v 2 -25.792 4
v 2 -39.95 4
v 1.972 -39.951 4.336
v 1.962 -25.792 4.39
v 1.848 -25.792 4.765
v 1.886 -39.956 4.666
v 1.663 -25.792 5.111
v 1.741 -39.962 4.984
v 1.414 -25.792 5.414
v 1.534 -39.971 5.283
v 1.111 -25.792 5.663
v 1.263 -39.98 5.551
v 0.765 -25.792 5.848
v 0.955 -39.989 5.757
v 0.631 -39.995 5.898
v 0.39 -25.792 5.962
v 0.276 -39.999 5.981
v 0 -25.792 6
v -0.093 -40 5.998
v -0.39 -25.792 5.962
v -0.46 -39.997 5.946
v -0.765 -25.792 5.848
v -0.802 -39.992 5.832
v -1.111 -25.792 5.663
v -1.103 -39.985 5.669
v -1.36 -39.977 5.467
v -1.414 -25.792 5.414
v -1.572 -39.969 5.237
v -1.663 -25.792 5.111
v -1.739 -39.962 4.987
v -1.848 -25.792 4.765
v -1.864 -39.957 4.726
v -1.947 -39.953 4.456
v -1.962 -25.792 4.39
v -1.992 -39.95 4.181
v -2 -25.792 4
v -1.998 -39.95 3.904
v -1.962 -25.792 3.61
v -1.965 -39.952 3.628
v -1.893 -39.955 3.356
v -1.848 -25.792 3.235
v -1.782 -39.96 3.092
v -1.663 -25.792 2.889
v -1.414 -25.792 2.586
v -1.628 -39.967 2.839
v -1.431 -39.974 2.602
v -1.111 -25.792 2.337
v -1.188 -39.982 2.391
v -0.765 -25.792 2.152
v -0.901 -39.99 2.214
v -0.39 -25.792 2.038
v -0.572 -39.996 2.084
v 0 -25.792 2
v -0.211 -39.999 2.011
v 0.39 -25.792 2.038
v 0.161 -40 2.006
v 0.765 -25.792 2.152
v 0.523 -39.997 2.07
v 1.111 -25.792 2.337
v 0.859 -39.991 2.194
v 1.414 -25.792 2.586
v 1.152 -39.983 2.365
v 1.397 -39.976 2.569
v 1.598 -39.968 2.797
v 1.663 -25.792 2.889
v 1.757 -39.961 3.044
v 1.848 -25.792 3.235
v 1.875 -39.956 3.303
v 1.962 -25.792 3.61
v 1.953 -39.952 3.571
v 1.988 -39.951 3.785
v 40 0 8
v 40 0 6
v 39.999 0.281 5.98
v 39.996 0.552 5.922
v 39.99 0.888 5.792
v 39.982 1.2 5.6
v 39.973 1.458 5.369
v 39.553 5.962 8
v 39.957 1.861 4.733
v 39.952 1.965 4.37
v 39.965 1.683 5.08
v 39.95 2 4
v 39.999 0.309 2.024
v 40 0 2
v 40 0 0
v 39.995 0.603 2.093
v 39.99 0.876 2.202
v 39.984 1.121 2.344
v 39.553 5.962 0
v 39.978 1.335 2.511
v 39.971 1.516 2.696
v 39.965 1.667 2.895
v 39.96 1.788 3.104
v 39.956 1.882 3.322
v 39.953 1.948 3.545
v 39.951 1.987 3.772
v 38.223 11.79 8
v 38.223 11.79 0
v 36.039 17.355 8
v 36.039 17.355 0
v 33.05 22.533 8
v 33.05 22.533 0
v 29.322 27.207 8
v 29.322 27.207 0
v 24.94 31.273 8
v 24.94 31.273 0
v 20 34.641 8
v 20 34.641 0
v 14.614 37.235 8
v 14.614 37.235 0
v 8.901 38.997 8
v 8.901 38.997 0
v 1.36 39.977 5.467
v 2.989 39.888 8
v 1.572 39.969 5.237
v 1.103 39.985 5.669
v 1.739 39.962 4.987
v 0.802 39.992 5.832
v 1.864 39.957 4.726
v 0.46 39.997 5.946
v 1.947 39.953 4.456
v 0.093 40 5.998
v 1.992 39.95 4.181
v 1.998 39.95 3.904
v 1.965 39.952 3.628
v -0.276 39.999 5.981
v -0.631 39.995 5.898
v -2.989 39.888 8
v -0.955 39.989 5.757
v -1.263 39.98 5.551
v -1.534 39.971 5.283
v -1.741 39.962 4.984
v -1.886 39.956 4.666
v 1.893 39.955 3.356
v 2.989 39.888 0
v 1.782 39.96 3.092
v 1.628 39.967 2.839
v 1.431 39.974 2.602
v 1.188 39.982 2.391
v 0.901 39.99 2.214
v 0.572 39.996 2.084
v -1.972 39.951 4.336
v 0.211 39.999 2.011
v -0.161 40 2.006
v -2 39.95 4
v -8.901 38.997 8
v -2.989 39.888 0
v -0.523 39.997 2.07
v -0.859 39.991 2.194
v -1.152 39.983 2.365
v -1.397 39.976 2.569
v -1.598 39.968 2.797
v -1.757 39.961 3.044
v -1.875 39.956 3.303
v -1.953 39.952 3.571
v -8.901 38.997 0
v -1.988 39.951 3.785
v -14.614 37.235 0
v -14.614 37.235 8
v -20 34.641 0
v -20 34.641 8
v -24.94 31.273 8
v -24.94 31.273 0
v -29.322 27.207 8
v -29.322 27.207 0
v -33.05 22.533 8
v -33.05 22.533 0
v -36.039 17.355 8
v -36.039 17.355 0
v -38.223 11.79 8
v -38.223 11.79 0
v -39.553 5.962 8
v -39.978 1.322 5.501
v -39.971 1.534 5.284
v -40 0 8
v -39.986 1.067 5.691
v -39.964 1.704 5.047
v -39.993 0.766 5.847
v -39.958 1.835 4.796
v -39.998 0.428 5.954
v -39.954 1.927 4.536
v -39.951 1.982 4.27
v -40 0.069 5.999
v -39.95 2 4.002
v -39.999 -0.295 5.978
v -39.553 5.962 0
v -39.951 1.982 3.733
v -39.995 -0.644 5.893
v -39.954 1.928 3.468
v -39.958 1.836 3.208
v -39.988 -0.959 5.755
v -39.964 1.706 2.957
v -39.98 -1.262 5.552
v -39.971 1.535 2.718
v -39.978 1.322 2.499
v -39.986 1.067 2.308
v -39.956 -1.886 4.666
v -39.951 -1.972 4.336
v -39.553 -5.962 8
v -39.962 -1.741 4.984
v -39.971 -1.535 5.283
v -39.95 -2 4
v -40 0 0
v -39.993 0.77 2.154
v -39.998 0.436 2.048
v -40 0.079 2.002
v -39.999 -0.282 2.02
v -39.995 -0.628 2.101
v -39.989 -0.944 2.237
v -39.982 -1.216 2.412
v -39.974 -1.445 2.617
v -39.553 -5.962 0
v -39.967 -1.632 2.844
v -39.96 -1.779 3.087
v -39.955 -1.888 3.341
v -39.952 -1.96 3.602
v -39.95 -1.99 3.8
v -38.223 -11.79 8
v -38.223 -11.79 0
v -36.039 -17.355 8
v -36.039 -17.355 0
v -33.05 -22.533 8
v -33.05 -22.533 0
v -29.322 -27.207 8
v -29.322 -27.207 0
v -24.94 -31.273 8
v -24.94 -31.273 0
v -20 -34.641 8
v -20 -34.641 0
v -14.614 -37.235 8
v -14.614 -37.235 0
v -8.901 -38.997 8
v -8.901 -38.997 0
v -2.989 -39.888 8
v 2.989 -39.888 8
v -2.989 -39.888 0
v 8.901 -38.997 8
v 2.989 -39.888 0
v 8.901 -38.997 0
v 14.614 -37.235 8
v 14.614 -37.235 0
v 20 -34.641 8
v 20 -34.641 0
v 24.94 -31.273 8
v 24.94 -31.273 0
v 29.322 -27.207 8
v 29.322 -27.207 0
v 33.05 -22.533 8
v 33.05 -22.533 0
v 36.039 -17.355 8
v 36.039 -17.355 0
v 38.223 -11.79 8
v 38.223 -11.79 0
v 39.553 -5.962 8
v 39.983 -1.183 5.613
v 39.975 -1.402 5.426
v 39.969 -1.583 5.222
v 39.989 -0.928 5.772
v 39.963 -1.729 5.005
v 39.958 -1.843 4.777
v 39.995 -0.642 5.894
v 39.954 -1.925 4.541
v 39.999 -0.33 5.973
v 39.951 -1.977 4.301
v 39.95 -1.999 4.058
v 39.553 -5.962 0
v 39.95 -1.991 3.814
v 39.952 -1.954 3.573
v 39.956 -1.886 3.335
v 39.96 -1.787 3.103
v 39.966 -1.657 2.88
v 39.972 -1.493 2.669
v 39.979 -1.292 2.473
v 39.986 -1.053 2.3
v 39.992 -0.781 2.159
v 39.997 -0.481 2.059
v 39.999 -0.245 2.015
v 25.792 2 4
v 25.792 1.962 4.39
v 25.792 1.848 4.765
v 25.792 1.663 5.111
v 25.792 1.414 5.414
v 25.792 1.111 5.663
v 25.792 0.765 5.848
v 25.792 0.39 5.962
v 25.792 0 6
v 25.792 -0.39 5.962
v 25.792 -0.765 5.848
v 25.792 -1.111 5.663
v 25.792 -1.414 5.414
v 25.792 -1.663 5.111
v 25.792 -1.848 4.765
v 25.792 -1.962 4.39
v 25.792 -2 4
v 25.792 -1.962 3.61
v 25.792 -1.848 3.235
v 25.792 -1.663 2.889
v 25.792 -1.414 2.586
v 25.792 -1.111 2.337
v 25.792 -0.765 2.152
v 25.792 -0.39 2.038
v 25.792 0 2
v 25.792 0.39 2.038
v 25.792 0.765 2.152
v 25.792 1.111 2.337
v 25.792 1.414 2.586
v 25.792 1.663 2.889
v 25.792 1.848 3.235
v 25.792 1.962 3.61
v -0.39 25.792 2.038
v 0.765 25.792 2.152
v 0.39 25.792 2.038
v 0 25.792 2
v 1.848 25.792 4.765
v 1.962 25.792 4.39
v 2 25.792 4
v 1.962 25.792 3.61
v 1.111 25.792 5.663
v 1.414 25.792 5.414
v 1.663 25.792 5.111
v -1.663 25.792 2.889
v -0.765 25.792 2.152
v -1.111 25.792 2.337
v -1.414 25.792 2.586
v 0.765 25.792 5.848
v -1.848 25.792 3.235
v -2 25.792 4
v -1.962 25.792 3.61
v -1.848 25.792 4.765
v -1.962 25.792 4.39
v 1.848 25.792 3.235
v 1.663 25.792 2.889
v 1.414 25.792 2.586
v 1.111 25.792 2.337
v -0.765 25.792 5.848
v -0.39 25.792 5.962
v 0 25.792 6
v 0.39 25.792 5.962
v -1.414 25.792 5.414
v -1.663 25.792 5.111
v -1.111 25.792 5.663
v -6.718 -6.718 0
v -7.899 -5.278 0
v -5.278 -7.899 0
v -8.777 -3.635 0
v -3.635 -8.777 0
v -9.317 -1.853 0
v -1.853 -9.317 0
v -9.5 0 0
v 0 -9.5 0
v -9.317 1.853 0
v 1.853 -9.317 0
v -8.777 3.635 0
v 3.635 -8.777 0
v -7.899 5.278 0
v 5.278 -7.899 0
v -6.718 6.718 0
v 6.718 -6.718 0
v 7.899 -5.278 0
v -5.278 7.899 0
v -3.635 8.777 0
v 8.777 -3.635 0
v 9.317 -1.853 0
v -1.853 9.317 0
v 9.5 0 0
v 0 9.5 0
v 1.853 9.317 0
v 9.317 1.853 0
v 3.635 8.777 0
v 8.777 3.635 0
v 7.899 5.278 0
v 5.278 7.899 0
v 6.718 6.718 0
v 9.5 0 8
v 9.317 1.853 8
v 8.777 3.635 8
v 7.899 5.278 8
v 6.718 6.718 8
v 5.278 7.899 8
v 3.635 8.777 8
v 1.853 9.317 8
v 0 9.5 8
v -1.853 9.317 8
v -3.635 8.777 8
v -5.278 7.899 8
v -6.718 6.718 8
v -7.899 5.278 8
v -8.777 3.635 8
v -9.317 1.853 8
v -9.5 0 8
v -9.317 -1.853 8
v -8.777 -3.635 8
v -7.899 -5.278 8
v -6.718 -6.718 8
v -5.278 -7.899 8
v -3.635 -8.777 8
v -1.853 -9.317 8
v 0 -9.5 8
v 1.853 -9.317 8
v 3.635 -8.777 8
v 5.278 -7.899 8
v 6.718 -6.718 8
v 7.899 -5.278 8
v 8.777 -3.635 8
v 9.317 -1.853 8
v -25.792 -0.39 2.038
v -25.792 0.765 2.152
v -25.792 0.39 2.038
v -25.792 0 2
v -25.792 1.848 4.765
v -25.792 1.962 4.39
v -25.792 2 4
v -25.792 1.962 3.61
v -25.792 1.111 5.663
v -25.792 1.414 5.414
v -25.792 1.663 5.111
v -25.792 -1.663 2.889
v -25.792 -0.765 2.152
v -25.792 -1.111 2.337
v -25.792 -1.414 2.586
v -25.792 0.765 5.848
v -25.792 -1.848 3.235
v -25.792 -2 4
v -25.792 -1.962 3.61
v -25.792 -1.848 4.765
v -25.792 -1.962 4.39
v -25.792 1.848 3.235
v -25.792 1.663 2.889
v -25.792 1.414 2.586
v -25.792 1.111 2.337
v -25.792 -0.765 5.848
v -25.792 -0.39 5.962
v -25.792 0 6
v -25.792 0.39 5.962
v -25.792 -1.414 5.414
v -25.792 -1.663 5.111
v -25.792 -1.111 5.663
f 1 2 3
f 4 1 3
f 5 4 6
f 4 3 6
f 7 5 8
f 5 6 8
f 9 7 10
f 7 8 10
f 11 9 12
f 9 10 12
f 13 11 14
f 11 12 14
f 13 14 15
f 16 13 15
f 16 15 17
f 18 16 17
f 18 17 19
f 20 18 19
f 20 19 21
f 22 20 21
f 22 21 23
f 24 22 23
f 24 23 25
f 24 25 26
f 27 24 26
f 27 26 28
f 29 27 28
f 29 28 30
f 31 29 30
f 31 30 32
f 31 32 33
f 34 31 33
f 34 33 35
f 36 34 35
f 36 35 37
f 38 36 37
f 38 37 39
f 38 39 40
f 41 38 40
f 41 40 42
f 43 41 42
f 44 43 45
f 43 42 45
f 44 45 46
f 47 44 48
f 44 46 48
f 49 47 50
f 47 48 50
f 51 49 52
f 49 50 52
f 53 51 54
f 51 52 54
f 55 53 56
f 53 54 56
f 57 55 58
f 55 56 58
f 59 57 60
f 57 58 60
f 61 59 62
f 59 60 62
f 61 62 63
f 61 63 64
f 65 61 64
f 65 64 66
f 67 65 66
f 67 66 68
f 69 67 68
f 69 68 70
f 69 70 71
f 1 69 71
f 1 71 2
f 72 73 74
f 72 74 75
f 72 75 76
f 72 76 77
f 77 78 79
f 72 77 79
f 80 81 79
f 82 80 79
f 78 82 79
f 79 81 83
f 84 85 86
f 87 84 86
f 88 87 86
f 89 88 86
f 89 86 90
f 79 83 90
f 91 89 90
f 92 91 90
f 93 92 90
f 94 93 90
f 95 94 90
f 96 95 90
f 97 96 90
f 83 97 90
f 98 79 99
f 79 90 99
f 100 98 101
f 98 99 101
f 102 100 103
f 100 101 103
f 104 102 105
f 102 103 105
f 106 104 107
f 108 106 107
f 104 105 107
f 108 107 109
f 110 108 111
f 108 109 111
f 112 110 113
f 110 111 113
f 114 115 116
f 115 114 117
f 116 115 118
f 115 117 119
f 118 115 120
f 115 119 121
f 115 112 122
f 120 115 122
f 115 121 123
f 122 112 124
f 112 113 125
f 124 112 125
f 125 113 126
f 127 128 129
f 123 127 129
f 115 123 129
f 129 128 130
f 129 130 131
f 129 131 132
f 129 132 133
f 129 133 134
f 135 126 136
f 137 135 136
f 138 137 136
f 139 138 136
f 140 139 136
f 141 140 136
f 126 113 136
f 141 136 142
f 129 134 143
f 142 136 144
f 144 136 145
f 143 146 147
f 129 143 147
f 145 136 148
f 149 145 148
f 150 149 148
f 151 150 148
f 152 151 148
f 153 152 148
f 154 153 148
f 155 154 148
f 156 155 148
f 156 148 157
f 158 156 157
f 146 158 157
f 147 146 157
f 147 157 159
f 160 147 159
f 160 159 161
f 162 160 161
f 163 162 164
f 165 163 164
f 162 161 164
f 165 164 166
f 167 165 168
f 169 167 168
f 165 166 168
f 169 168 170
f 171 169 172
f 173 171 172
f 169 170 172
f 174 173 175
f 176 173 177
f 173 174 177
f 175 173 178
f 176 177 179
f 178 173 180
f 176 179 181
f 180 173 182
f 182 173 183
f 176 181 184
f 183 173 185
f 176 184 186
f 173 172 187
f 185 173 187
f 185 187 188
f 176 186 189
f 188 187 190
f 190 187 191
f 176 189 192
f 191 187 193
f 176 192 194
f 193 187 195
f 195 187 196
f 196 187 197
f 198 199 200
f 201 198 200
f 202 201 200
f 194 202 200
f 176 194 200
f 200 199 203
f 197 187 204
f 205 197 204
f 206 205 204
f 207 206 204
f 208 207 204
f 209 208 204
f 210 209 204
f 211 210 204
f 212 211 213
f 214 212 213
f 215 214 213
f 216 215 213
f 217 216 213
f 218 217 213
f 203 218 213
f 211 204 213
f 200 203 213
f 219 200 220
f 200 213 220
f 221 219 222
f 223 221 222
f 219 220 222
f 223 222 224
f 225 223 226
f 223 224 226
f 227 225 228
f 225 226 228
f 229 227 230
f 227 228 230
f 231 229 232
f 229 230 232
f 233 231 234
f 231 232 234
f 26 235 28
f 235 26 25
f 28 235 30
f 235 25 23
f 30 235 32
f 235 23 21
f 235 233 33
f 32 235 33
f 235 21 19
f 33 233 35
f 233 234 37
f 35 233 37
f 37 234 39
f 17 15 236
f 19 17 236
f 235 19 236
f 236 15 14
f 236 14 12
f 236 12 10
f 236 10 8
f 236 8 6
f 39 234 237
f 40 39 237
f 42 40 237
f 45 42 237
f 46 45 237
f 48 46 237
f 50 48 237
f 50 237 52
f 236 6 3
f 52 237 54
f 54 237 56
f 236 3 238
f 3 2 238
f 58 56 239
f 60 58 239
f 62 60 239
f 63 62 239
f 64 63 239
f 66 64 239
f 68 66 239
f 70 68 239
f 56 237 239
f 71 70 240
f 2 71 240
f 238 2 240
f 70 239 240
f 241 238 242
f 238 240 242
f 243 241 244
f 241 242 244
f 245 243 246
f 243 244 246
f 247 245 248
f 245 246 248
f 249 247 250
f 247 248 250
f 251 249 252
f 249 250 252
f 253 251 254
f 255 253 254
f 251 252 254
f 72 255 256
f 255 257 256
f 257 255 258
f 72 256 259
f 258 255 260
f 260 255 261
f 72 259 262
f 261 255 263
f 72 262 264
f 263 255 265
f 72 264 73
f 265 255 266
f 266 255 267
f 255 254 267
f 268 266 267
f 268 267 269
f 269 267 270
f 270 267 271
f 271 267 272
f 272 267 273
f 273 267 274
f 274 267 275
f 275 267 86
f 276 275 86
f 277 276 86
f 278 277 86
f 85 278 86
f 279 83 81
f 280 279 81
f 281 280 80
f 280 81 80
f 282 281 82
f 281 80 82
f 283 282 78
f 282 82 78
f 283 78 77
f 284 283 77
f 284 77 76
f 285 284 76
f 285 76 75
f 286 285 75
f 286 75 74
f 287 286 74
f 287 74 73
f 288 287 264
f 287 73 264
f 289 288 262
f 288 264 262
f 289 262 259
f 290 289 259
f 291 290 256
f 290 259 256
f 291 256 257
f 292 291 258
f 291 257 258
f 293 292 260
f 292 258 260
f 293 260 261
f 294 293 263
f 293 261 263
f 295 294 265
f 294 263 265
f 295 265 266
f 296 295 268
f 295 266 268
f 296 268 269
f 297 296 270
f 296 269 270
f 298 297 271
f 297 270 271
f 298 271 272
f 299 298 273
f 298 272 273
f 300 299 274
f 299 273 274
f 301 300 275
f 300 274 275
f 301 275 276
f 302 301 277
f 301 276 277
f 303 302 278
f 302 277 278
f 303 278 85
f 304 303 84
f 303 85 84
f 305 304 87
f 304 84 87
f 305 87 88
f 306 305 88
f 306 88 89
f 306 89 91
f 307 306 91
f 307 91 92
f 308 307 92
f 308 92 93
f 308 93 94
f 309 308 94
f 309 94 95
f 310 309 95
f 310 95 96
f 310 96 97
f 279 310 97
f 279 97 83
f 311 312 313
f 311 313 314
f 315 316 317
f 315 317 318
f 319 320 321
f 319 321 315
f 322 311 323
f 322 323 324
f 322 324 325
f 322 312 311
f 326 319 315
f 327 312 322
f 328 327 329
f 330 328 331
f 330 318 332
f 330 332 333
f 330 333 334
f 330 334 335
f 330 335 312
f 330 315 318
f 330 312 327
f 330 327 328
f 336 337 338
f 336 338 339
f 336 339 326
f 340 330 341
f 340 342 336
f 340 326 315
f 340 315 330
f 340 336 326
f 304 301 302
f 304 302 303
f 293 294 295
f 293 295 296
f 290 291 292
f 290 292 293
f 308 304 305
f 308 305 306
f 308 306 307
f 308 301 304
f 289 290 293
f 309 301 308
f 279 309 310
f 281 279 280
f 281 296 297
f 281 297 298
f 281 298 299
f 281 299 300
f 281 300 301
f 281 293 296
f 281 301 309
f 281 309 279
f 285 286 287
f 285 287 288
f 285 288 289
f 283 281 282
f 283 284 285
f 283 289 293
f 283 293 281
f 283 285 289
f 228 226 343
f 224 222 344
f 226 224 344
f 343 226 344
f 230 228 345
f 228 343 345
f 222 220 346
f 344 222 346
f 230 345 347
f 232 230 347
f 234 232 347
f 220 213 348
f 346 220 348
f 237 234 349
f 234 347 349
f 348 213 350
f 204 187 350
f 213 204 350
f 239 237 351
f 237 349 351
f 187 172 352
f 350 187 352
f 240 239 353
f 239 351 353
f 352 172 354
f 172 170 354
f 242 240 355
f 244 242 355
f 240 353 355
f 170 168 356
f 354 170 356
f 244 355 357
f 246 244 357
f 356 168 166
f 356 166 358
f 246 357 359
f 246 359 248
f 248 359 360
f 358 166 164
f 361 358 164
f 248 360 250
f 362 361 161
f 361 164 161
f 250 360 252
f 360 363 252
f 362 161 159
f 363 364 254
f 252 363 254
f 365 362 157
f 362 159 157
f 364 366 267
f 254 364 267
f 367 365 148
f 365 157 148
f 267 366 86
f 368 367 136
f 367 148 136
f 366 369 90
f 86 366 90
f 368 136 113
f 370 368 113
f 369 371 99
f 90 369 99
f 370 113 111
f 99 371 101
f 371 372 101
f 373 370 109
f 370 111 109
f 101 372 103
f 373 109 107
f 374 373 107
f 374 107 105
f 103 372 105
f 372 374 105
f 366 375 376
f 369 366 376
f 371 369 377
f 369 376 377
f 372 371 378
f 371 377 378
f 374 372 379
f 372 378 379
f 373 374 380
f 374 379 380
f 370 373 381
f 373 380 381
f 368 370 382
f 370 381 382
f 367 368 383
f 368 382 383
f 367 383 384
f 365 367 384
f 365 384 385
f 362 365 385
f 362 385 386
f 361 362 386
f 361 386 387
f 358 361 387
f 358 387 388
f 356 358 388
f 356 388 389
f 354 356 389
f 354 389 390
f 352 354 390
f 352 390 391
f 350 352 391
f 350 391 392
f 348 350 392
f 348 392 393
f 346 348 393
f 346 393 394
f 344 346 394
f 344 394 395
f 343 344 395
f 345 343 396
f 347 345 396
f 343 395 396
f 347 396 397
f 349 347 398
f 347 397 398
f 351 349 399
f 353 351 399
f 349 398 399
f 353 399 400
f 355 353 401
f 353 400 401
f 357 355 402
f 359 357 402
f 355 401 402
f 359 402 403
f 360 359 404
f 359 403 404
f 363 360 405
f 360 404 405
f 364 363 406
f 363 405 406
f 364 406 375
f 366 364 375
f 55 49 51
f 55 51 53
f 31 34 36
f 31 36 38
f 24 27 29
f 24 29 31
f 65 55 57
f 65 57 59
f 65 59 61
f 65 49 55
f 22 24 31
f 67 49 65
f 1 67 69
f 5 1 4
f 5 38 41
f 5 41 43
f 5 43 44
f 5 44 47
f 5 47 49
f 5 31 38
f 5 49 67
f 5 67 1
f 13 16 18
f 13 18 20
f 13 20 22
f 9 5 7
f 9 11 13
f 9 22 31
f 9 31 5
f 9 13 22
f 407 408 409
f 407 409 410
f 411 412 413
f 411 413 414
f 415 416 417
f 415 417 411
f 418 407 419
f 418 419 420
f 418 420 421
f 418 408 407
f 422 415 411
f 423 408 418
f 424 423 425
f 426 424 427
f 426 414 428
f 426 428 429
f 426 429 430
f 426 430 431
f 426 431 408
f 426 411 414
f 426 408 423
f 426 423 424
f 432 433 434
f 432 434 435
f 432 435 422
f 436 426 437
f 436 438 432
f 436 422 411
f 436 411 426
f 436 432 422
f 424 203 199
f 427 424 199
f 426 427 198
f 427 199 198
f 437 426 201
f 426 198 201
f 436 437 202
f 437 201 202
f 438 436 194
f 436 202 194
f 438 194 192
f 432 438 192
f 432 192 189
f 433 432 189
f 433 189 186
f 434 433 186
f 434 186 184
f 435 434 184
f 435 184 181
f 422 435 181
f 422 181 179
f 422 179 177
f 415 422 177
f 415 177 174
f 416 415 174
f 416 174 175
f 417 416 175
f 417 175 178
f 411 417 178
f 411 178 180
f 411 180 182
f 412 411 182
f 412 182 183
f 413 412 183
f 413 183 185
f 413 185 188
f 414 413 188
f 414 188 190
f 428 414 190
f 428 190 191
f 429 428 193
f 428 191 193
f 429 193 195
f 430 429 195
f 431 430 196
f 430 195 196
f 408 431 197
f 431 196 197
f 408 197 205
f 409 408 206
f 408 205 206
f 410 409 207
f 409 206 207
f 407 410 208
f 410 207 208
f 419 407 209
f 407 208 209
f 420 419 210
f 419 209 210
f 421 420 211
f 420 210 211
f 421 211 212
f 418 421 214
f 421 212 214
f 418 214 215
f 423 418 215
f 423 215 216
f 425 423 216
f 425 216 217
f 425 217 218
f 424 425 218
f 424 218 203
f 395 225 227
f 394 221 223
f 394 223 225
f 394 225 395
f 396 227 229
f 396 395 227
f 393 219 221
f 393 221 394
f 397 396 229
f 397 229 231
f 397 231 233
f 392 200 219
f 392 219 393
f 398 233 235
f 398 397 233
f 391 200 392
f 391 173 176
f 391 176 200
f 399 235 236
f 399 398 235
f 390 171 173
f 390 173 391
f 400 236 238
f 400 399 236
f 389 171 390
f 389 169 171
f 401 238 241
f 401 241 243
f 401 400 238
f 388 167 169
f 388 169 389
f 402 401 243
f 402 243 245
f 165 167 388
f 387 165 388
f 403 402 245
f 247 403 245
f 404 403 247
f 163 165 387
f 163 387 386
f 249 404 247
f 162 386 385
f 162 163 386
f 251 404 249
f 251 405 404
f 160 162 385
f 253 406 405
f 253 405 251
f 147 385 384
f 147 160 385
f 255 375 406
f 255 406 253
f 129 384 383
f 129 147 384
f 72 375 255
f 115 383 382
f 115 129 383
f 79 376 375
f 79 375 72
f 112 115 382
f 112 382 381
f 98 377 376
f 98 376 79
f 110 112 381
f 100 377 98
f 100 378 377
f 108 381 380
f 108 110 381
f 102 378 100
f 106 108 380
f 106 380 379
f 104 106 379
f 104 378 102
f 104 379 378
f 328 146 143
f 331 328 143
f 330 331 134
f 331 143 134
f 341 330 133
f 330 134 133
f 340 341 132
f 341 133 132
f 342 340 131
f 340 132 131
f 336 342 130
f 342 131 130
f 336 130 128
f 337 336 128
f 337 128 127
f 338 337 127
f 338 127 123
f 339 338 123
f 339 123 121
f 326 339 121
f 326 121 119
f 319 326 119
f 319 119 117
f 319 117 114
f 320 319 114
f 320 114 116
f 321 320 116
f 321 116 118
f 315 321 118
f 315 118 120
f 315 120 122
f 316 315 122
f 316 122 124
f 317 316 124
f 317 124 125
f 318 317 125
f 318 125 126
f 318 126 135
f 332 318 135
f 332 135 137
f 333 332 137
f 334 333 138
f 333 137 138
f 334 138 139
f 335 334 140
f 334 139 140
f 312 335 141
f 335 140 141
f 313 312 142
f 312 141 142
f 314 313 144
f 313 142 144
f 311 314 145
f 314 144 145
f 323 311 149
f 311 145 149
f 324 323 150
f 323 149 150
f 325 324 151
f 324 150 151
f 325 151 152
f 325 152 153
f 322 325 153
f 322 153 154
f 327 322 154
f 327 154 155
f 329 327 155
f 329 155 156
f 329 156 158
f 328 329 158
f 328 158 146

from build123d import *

# Parameters (mm, degrees)
F0_R            = 40
F1_DEPTH        = 8
F2_R            = 9.5
F3_DEPTH        = 8.001
F6_R            = 2
F7_DEPTH        = 15
F7_COPIES_COUNT = 4


# Not quite as in the source:
# - a pattern or mirror of a feature is missing from the dataset's text; its kind, count and spacing are read off the source's solid


with BuildPart() as f1:
    # F0 (on Top) → F1 (new body)
    with BuildSketch(Plane.XY):
        Circle(F0_R)
    extrude(amount=F1_DEPTH)

    # F2 (on face) → F3 (cut, through all)
    with BuildSketch(Plane.XY.offset(8)):
        Circle(F2_R)
    extrude(amount=-F3_DEPTH, mode=Mode.SUBTRACT)

    # F6 (on offset) → F7 (cut)
    with BuildSketch(Plane.XZ.offset(40.792)):
        with Locations((0, 4)):
            Circle(F6_R)
    f7 = extrude(amount=-F7_DEPTH, mode=Mode.SUBTRACT)

    # F7_copies: F7 ×4 about axis
    f7_copies_axis = Axis((0, 0, 0), (0, 0, 1))
    for i in range(1, F7_COPIES_COUNT):
        add(f7.rotate(f7_copies_axis, i * 360 / F7_COPIES_COUNT), mode=Mode.SUBTRACT)


solid = f1.part
